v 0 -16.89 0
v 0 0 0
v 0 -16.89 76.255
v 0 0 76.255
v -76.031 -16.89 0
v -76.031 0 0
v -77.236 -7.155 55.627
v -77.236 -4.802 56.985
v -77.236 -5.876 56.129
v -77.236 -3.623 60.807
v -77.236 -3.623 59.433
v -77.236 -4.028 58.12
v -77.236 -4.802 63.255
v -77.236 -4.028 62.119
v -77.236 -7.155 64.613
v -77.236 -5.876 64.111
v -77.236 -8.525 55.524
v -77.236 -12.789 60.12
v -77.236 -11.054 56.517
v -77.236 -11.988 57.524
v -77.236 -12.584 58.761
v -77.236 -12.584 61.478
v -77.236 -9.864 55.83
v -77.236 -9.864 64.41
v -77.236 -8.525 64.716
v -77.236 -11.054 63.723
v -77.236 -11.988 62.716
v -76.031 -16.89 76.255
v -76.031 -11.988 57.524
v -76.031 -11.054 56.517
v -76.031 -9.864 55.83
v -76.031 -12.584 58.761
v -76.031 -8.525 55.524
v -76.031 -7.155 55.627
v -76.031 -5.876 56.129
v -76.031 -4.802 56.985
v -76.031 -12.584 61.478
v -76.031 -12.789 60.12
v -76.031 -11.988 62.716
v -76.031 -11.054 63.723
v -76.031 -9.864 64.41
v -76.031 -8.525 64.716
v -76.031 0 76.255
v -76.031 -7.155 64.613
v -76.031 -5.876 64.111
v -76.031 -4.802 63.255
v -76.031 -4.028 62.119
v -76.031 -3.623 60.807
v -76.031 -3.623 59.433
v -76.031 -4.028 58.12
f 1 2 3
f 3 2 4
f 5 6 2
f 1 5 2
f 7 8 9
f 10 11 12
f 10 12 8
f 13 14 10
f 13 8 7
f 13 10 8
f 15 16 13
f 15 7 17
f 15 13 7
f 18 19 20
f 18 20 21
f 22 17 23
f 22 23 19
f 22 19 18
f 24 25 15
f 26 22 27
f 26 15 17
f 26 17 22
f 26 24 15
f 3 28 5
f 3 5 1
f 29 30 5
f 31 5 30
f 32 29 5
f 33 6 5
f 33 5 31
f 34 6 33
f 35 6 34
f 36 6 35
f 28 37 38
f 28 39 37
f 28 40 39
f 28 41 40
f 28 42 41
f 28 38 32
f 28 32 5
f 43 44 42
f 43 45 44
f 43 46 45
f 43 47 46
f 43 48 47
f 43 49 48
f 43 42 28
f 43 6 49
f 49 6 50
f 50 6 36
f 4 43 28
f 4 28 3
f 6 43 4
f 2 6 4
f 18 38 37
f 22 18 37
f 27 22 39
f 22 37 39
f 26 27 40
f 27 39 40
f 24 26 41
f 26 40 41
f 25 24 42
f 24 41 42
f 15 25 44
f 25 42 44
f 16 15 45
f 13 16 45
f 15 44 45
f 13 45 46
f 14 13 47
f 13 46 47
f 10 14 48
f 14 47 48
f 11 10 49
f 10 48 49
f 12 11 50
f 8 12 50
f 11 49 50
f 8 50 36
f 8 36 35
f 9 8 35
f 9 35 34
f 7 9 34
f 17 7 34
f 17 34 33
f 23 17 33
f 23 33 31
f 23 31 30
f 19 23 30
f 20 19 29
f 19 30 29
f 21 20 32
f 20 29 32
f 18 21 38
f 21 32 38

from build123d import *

# Parameters (mm, degrees)
F0_W     = 76.031186
F0_H     = 76.254733
F1_DEPTH = 16.889574
F2_R     = 4.608742
F3_DEPTH = 1.204457


with BuildPart() as f1:
    # F0 (on Front) → F1 (new body)
    with BuildSketch(Plane.XZ):
        with Locations((-38.015593, 38.127367)):
            Rectangle(F0_W, F0_H)
    extrude(amount=F1_DEPTH)

    # F2 (on face) → F3 (join)
    with BuildSketch(Plane(origin=(-76.031186, 0, 0), x_dir=(0, -1, 0), z_dir=(-1, 0, 0))):
        with Locations((8.180324, 60.1198)):
            Circle(F2_R)
    extrude(amount=F3_DEPTH)


solid = f1.part
